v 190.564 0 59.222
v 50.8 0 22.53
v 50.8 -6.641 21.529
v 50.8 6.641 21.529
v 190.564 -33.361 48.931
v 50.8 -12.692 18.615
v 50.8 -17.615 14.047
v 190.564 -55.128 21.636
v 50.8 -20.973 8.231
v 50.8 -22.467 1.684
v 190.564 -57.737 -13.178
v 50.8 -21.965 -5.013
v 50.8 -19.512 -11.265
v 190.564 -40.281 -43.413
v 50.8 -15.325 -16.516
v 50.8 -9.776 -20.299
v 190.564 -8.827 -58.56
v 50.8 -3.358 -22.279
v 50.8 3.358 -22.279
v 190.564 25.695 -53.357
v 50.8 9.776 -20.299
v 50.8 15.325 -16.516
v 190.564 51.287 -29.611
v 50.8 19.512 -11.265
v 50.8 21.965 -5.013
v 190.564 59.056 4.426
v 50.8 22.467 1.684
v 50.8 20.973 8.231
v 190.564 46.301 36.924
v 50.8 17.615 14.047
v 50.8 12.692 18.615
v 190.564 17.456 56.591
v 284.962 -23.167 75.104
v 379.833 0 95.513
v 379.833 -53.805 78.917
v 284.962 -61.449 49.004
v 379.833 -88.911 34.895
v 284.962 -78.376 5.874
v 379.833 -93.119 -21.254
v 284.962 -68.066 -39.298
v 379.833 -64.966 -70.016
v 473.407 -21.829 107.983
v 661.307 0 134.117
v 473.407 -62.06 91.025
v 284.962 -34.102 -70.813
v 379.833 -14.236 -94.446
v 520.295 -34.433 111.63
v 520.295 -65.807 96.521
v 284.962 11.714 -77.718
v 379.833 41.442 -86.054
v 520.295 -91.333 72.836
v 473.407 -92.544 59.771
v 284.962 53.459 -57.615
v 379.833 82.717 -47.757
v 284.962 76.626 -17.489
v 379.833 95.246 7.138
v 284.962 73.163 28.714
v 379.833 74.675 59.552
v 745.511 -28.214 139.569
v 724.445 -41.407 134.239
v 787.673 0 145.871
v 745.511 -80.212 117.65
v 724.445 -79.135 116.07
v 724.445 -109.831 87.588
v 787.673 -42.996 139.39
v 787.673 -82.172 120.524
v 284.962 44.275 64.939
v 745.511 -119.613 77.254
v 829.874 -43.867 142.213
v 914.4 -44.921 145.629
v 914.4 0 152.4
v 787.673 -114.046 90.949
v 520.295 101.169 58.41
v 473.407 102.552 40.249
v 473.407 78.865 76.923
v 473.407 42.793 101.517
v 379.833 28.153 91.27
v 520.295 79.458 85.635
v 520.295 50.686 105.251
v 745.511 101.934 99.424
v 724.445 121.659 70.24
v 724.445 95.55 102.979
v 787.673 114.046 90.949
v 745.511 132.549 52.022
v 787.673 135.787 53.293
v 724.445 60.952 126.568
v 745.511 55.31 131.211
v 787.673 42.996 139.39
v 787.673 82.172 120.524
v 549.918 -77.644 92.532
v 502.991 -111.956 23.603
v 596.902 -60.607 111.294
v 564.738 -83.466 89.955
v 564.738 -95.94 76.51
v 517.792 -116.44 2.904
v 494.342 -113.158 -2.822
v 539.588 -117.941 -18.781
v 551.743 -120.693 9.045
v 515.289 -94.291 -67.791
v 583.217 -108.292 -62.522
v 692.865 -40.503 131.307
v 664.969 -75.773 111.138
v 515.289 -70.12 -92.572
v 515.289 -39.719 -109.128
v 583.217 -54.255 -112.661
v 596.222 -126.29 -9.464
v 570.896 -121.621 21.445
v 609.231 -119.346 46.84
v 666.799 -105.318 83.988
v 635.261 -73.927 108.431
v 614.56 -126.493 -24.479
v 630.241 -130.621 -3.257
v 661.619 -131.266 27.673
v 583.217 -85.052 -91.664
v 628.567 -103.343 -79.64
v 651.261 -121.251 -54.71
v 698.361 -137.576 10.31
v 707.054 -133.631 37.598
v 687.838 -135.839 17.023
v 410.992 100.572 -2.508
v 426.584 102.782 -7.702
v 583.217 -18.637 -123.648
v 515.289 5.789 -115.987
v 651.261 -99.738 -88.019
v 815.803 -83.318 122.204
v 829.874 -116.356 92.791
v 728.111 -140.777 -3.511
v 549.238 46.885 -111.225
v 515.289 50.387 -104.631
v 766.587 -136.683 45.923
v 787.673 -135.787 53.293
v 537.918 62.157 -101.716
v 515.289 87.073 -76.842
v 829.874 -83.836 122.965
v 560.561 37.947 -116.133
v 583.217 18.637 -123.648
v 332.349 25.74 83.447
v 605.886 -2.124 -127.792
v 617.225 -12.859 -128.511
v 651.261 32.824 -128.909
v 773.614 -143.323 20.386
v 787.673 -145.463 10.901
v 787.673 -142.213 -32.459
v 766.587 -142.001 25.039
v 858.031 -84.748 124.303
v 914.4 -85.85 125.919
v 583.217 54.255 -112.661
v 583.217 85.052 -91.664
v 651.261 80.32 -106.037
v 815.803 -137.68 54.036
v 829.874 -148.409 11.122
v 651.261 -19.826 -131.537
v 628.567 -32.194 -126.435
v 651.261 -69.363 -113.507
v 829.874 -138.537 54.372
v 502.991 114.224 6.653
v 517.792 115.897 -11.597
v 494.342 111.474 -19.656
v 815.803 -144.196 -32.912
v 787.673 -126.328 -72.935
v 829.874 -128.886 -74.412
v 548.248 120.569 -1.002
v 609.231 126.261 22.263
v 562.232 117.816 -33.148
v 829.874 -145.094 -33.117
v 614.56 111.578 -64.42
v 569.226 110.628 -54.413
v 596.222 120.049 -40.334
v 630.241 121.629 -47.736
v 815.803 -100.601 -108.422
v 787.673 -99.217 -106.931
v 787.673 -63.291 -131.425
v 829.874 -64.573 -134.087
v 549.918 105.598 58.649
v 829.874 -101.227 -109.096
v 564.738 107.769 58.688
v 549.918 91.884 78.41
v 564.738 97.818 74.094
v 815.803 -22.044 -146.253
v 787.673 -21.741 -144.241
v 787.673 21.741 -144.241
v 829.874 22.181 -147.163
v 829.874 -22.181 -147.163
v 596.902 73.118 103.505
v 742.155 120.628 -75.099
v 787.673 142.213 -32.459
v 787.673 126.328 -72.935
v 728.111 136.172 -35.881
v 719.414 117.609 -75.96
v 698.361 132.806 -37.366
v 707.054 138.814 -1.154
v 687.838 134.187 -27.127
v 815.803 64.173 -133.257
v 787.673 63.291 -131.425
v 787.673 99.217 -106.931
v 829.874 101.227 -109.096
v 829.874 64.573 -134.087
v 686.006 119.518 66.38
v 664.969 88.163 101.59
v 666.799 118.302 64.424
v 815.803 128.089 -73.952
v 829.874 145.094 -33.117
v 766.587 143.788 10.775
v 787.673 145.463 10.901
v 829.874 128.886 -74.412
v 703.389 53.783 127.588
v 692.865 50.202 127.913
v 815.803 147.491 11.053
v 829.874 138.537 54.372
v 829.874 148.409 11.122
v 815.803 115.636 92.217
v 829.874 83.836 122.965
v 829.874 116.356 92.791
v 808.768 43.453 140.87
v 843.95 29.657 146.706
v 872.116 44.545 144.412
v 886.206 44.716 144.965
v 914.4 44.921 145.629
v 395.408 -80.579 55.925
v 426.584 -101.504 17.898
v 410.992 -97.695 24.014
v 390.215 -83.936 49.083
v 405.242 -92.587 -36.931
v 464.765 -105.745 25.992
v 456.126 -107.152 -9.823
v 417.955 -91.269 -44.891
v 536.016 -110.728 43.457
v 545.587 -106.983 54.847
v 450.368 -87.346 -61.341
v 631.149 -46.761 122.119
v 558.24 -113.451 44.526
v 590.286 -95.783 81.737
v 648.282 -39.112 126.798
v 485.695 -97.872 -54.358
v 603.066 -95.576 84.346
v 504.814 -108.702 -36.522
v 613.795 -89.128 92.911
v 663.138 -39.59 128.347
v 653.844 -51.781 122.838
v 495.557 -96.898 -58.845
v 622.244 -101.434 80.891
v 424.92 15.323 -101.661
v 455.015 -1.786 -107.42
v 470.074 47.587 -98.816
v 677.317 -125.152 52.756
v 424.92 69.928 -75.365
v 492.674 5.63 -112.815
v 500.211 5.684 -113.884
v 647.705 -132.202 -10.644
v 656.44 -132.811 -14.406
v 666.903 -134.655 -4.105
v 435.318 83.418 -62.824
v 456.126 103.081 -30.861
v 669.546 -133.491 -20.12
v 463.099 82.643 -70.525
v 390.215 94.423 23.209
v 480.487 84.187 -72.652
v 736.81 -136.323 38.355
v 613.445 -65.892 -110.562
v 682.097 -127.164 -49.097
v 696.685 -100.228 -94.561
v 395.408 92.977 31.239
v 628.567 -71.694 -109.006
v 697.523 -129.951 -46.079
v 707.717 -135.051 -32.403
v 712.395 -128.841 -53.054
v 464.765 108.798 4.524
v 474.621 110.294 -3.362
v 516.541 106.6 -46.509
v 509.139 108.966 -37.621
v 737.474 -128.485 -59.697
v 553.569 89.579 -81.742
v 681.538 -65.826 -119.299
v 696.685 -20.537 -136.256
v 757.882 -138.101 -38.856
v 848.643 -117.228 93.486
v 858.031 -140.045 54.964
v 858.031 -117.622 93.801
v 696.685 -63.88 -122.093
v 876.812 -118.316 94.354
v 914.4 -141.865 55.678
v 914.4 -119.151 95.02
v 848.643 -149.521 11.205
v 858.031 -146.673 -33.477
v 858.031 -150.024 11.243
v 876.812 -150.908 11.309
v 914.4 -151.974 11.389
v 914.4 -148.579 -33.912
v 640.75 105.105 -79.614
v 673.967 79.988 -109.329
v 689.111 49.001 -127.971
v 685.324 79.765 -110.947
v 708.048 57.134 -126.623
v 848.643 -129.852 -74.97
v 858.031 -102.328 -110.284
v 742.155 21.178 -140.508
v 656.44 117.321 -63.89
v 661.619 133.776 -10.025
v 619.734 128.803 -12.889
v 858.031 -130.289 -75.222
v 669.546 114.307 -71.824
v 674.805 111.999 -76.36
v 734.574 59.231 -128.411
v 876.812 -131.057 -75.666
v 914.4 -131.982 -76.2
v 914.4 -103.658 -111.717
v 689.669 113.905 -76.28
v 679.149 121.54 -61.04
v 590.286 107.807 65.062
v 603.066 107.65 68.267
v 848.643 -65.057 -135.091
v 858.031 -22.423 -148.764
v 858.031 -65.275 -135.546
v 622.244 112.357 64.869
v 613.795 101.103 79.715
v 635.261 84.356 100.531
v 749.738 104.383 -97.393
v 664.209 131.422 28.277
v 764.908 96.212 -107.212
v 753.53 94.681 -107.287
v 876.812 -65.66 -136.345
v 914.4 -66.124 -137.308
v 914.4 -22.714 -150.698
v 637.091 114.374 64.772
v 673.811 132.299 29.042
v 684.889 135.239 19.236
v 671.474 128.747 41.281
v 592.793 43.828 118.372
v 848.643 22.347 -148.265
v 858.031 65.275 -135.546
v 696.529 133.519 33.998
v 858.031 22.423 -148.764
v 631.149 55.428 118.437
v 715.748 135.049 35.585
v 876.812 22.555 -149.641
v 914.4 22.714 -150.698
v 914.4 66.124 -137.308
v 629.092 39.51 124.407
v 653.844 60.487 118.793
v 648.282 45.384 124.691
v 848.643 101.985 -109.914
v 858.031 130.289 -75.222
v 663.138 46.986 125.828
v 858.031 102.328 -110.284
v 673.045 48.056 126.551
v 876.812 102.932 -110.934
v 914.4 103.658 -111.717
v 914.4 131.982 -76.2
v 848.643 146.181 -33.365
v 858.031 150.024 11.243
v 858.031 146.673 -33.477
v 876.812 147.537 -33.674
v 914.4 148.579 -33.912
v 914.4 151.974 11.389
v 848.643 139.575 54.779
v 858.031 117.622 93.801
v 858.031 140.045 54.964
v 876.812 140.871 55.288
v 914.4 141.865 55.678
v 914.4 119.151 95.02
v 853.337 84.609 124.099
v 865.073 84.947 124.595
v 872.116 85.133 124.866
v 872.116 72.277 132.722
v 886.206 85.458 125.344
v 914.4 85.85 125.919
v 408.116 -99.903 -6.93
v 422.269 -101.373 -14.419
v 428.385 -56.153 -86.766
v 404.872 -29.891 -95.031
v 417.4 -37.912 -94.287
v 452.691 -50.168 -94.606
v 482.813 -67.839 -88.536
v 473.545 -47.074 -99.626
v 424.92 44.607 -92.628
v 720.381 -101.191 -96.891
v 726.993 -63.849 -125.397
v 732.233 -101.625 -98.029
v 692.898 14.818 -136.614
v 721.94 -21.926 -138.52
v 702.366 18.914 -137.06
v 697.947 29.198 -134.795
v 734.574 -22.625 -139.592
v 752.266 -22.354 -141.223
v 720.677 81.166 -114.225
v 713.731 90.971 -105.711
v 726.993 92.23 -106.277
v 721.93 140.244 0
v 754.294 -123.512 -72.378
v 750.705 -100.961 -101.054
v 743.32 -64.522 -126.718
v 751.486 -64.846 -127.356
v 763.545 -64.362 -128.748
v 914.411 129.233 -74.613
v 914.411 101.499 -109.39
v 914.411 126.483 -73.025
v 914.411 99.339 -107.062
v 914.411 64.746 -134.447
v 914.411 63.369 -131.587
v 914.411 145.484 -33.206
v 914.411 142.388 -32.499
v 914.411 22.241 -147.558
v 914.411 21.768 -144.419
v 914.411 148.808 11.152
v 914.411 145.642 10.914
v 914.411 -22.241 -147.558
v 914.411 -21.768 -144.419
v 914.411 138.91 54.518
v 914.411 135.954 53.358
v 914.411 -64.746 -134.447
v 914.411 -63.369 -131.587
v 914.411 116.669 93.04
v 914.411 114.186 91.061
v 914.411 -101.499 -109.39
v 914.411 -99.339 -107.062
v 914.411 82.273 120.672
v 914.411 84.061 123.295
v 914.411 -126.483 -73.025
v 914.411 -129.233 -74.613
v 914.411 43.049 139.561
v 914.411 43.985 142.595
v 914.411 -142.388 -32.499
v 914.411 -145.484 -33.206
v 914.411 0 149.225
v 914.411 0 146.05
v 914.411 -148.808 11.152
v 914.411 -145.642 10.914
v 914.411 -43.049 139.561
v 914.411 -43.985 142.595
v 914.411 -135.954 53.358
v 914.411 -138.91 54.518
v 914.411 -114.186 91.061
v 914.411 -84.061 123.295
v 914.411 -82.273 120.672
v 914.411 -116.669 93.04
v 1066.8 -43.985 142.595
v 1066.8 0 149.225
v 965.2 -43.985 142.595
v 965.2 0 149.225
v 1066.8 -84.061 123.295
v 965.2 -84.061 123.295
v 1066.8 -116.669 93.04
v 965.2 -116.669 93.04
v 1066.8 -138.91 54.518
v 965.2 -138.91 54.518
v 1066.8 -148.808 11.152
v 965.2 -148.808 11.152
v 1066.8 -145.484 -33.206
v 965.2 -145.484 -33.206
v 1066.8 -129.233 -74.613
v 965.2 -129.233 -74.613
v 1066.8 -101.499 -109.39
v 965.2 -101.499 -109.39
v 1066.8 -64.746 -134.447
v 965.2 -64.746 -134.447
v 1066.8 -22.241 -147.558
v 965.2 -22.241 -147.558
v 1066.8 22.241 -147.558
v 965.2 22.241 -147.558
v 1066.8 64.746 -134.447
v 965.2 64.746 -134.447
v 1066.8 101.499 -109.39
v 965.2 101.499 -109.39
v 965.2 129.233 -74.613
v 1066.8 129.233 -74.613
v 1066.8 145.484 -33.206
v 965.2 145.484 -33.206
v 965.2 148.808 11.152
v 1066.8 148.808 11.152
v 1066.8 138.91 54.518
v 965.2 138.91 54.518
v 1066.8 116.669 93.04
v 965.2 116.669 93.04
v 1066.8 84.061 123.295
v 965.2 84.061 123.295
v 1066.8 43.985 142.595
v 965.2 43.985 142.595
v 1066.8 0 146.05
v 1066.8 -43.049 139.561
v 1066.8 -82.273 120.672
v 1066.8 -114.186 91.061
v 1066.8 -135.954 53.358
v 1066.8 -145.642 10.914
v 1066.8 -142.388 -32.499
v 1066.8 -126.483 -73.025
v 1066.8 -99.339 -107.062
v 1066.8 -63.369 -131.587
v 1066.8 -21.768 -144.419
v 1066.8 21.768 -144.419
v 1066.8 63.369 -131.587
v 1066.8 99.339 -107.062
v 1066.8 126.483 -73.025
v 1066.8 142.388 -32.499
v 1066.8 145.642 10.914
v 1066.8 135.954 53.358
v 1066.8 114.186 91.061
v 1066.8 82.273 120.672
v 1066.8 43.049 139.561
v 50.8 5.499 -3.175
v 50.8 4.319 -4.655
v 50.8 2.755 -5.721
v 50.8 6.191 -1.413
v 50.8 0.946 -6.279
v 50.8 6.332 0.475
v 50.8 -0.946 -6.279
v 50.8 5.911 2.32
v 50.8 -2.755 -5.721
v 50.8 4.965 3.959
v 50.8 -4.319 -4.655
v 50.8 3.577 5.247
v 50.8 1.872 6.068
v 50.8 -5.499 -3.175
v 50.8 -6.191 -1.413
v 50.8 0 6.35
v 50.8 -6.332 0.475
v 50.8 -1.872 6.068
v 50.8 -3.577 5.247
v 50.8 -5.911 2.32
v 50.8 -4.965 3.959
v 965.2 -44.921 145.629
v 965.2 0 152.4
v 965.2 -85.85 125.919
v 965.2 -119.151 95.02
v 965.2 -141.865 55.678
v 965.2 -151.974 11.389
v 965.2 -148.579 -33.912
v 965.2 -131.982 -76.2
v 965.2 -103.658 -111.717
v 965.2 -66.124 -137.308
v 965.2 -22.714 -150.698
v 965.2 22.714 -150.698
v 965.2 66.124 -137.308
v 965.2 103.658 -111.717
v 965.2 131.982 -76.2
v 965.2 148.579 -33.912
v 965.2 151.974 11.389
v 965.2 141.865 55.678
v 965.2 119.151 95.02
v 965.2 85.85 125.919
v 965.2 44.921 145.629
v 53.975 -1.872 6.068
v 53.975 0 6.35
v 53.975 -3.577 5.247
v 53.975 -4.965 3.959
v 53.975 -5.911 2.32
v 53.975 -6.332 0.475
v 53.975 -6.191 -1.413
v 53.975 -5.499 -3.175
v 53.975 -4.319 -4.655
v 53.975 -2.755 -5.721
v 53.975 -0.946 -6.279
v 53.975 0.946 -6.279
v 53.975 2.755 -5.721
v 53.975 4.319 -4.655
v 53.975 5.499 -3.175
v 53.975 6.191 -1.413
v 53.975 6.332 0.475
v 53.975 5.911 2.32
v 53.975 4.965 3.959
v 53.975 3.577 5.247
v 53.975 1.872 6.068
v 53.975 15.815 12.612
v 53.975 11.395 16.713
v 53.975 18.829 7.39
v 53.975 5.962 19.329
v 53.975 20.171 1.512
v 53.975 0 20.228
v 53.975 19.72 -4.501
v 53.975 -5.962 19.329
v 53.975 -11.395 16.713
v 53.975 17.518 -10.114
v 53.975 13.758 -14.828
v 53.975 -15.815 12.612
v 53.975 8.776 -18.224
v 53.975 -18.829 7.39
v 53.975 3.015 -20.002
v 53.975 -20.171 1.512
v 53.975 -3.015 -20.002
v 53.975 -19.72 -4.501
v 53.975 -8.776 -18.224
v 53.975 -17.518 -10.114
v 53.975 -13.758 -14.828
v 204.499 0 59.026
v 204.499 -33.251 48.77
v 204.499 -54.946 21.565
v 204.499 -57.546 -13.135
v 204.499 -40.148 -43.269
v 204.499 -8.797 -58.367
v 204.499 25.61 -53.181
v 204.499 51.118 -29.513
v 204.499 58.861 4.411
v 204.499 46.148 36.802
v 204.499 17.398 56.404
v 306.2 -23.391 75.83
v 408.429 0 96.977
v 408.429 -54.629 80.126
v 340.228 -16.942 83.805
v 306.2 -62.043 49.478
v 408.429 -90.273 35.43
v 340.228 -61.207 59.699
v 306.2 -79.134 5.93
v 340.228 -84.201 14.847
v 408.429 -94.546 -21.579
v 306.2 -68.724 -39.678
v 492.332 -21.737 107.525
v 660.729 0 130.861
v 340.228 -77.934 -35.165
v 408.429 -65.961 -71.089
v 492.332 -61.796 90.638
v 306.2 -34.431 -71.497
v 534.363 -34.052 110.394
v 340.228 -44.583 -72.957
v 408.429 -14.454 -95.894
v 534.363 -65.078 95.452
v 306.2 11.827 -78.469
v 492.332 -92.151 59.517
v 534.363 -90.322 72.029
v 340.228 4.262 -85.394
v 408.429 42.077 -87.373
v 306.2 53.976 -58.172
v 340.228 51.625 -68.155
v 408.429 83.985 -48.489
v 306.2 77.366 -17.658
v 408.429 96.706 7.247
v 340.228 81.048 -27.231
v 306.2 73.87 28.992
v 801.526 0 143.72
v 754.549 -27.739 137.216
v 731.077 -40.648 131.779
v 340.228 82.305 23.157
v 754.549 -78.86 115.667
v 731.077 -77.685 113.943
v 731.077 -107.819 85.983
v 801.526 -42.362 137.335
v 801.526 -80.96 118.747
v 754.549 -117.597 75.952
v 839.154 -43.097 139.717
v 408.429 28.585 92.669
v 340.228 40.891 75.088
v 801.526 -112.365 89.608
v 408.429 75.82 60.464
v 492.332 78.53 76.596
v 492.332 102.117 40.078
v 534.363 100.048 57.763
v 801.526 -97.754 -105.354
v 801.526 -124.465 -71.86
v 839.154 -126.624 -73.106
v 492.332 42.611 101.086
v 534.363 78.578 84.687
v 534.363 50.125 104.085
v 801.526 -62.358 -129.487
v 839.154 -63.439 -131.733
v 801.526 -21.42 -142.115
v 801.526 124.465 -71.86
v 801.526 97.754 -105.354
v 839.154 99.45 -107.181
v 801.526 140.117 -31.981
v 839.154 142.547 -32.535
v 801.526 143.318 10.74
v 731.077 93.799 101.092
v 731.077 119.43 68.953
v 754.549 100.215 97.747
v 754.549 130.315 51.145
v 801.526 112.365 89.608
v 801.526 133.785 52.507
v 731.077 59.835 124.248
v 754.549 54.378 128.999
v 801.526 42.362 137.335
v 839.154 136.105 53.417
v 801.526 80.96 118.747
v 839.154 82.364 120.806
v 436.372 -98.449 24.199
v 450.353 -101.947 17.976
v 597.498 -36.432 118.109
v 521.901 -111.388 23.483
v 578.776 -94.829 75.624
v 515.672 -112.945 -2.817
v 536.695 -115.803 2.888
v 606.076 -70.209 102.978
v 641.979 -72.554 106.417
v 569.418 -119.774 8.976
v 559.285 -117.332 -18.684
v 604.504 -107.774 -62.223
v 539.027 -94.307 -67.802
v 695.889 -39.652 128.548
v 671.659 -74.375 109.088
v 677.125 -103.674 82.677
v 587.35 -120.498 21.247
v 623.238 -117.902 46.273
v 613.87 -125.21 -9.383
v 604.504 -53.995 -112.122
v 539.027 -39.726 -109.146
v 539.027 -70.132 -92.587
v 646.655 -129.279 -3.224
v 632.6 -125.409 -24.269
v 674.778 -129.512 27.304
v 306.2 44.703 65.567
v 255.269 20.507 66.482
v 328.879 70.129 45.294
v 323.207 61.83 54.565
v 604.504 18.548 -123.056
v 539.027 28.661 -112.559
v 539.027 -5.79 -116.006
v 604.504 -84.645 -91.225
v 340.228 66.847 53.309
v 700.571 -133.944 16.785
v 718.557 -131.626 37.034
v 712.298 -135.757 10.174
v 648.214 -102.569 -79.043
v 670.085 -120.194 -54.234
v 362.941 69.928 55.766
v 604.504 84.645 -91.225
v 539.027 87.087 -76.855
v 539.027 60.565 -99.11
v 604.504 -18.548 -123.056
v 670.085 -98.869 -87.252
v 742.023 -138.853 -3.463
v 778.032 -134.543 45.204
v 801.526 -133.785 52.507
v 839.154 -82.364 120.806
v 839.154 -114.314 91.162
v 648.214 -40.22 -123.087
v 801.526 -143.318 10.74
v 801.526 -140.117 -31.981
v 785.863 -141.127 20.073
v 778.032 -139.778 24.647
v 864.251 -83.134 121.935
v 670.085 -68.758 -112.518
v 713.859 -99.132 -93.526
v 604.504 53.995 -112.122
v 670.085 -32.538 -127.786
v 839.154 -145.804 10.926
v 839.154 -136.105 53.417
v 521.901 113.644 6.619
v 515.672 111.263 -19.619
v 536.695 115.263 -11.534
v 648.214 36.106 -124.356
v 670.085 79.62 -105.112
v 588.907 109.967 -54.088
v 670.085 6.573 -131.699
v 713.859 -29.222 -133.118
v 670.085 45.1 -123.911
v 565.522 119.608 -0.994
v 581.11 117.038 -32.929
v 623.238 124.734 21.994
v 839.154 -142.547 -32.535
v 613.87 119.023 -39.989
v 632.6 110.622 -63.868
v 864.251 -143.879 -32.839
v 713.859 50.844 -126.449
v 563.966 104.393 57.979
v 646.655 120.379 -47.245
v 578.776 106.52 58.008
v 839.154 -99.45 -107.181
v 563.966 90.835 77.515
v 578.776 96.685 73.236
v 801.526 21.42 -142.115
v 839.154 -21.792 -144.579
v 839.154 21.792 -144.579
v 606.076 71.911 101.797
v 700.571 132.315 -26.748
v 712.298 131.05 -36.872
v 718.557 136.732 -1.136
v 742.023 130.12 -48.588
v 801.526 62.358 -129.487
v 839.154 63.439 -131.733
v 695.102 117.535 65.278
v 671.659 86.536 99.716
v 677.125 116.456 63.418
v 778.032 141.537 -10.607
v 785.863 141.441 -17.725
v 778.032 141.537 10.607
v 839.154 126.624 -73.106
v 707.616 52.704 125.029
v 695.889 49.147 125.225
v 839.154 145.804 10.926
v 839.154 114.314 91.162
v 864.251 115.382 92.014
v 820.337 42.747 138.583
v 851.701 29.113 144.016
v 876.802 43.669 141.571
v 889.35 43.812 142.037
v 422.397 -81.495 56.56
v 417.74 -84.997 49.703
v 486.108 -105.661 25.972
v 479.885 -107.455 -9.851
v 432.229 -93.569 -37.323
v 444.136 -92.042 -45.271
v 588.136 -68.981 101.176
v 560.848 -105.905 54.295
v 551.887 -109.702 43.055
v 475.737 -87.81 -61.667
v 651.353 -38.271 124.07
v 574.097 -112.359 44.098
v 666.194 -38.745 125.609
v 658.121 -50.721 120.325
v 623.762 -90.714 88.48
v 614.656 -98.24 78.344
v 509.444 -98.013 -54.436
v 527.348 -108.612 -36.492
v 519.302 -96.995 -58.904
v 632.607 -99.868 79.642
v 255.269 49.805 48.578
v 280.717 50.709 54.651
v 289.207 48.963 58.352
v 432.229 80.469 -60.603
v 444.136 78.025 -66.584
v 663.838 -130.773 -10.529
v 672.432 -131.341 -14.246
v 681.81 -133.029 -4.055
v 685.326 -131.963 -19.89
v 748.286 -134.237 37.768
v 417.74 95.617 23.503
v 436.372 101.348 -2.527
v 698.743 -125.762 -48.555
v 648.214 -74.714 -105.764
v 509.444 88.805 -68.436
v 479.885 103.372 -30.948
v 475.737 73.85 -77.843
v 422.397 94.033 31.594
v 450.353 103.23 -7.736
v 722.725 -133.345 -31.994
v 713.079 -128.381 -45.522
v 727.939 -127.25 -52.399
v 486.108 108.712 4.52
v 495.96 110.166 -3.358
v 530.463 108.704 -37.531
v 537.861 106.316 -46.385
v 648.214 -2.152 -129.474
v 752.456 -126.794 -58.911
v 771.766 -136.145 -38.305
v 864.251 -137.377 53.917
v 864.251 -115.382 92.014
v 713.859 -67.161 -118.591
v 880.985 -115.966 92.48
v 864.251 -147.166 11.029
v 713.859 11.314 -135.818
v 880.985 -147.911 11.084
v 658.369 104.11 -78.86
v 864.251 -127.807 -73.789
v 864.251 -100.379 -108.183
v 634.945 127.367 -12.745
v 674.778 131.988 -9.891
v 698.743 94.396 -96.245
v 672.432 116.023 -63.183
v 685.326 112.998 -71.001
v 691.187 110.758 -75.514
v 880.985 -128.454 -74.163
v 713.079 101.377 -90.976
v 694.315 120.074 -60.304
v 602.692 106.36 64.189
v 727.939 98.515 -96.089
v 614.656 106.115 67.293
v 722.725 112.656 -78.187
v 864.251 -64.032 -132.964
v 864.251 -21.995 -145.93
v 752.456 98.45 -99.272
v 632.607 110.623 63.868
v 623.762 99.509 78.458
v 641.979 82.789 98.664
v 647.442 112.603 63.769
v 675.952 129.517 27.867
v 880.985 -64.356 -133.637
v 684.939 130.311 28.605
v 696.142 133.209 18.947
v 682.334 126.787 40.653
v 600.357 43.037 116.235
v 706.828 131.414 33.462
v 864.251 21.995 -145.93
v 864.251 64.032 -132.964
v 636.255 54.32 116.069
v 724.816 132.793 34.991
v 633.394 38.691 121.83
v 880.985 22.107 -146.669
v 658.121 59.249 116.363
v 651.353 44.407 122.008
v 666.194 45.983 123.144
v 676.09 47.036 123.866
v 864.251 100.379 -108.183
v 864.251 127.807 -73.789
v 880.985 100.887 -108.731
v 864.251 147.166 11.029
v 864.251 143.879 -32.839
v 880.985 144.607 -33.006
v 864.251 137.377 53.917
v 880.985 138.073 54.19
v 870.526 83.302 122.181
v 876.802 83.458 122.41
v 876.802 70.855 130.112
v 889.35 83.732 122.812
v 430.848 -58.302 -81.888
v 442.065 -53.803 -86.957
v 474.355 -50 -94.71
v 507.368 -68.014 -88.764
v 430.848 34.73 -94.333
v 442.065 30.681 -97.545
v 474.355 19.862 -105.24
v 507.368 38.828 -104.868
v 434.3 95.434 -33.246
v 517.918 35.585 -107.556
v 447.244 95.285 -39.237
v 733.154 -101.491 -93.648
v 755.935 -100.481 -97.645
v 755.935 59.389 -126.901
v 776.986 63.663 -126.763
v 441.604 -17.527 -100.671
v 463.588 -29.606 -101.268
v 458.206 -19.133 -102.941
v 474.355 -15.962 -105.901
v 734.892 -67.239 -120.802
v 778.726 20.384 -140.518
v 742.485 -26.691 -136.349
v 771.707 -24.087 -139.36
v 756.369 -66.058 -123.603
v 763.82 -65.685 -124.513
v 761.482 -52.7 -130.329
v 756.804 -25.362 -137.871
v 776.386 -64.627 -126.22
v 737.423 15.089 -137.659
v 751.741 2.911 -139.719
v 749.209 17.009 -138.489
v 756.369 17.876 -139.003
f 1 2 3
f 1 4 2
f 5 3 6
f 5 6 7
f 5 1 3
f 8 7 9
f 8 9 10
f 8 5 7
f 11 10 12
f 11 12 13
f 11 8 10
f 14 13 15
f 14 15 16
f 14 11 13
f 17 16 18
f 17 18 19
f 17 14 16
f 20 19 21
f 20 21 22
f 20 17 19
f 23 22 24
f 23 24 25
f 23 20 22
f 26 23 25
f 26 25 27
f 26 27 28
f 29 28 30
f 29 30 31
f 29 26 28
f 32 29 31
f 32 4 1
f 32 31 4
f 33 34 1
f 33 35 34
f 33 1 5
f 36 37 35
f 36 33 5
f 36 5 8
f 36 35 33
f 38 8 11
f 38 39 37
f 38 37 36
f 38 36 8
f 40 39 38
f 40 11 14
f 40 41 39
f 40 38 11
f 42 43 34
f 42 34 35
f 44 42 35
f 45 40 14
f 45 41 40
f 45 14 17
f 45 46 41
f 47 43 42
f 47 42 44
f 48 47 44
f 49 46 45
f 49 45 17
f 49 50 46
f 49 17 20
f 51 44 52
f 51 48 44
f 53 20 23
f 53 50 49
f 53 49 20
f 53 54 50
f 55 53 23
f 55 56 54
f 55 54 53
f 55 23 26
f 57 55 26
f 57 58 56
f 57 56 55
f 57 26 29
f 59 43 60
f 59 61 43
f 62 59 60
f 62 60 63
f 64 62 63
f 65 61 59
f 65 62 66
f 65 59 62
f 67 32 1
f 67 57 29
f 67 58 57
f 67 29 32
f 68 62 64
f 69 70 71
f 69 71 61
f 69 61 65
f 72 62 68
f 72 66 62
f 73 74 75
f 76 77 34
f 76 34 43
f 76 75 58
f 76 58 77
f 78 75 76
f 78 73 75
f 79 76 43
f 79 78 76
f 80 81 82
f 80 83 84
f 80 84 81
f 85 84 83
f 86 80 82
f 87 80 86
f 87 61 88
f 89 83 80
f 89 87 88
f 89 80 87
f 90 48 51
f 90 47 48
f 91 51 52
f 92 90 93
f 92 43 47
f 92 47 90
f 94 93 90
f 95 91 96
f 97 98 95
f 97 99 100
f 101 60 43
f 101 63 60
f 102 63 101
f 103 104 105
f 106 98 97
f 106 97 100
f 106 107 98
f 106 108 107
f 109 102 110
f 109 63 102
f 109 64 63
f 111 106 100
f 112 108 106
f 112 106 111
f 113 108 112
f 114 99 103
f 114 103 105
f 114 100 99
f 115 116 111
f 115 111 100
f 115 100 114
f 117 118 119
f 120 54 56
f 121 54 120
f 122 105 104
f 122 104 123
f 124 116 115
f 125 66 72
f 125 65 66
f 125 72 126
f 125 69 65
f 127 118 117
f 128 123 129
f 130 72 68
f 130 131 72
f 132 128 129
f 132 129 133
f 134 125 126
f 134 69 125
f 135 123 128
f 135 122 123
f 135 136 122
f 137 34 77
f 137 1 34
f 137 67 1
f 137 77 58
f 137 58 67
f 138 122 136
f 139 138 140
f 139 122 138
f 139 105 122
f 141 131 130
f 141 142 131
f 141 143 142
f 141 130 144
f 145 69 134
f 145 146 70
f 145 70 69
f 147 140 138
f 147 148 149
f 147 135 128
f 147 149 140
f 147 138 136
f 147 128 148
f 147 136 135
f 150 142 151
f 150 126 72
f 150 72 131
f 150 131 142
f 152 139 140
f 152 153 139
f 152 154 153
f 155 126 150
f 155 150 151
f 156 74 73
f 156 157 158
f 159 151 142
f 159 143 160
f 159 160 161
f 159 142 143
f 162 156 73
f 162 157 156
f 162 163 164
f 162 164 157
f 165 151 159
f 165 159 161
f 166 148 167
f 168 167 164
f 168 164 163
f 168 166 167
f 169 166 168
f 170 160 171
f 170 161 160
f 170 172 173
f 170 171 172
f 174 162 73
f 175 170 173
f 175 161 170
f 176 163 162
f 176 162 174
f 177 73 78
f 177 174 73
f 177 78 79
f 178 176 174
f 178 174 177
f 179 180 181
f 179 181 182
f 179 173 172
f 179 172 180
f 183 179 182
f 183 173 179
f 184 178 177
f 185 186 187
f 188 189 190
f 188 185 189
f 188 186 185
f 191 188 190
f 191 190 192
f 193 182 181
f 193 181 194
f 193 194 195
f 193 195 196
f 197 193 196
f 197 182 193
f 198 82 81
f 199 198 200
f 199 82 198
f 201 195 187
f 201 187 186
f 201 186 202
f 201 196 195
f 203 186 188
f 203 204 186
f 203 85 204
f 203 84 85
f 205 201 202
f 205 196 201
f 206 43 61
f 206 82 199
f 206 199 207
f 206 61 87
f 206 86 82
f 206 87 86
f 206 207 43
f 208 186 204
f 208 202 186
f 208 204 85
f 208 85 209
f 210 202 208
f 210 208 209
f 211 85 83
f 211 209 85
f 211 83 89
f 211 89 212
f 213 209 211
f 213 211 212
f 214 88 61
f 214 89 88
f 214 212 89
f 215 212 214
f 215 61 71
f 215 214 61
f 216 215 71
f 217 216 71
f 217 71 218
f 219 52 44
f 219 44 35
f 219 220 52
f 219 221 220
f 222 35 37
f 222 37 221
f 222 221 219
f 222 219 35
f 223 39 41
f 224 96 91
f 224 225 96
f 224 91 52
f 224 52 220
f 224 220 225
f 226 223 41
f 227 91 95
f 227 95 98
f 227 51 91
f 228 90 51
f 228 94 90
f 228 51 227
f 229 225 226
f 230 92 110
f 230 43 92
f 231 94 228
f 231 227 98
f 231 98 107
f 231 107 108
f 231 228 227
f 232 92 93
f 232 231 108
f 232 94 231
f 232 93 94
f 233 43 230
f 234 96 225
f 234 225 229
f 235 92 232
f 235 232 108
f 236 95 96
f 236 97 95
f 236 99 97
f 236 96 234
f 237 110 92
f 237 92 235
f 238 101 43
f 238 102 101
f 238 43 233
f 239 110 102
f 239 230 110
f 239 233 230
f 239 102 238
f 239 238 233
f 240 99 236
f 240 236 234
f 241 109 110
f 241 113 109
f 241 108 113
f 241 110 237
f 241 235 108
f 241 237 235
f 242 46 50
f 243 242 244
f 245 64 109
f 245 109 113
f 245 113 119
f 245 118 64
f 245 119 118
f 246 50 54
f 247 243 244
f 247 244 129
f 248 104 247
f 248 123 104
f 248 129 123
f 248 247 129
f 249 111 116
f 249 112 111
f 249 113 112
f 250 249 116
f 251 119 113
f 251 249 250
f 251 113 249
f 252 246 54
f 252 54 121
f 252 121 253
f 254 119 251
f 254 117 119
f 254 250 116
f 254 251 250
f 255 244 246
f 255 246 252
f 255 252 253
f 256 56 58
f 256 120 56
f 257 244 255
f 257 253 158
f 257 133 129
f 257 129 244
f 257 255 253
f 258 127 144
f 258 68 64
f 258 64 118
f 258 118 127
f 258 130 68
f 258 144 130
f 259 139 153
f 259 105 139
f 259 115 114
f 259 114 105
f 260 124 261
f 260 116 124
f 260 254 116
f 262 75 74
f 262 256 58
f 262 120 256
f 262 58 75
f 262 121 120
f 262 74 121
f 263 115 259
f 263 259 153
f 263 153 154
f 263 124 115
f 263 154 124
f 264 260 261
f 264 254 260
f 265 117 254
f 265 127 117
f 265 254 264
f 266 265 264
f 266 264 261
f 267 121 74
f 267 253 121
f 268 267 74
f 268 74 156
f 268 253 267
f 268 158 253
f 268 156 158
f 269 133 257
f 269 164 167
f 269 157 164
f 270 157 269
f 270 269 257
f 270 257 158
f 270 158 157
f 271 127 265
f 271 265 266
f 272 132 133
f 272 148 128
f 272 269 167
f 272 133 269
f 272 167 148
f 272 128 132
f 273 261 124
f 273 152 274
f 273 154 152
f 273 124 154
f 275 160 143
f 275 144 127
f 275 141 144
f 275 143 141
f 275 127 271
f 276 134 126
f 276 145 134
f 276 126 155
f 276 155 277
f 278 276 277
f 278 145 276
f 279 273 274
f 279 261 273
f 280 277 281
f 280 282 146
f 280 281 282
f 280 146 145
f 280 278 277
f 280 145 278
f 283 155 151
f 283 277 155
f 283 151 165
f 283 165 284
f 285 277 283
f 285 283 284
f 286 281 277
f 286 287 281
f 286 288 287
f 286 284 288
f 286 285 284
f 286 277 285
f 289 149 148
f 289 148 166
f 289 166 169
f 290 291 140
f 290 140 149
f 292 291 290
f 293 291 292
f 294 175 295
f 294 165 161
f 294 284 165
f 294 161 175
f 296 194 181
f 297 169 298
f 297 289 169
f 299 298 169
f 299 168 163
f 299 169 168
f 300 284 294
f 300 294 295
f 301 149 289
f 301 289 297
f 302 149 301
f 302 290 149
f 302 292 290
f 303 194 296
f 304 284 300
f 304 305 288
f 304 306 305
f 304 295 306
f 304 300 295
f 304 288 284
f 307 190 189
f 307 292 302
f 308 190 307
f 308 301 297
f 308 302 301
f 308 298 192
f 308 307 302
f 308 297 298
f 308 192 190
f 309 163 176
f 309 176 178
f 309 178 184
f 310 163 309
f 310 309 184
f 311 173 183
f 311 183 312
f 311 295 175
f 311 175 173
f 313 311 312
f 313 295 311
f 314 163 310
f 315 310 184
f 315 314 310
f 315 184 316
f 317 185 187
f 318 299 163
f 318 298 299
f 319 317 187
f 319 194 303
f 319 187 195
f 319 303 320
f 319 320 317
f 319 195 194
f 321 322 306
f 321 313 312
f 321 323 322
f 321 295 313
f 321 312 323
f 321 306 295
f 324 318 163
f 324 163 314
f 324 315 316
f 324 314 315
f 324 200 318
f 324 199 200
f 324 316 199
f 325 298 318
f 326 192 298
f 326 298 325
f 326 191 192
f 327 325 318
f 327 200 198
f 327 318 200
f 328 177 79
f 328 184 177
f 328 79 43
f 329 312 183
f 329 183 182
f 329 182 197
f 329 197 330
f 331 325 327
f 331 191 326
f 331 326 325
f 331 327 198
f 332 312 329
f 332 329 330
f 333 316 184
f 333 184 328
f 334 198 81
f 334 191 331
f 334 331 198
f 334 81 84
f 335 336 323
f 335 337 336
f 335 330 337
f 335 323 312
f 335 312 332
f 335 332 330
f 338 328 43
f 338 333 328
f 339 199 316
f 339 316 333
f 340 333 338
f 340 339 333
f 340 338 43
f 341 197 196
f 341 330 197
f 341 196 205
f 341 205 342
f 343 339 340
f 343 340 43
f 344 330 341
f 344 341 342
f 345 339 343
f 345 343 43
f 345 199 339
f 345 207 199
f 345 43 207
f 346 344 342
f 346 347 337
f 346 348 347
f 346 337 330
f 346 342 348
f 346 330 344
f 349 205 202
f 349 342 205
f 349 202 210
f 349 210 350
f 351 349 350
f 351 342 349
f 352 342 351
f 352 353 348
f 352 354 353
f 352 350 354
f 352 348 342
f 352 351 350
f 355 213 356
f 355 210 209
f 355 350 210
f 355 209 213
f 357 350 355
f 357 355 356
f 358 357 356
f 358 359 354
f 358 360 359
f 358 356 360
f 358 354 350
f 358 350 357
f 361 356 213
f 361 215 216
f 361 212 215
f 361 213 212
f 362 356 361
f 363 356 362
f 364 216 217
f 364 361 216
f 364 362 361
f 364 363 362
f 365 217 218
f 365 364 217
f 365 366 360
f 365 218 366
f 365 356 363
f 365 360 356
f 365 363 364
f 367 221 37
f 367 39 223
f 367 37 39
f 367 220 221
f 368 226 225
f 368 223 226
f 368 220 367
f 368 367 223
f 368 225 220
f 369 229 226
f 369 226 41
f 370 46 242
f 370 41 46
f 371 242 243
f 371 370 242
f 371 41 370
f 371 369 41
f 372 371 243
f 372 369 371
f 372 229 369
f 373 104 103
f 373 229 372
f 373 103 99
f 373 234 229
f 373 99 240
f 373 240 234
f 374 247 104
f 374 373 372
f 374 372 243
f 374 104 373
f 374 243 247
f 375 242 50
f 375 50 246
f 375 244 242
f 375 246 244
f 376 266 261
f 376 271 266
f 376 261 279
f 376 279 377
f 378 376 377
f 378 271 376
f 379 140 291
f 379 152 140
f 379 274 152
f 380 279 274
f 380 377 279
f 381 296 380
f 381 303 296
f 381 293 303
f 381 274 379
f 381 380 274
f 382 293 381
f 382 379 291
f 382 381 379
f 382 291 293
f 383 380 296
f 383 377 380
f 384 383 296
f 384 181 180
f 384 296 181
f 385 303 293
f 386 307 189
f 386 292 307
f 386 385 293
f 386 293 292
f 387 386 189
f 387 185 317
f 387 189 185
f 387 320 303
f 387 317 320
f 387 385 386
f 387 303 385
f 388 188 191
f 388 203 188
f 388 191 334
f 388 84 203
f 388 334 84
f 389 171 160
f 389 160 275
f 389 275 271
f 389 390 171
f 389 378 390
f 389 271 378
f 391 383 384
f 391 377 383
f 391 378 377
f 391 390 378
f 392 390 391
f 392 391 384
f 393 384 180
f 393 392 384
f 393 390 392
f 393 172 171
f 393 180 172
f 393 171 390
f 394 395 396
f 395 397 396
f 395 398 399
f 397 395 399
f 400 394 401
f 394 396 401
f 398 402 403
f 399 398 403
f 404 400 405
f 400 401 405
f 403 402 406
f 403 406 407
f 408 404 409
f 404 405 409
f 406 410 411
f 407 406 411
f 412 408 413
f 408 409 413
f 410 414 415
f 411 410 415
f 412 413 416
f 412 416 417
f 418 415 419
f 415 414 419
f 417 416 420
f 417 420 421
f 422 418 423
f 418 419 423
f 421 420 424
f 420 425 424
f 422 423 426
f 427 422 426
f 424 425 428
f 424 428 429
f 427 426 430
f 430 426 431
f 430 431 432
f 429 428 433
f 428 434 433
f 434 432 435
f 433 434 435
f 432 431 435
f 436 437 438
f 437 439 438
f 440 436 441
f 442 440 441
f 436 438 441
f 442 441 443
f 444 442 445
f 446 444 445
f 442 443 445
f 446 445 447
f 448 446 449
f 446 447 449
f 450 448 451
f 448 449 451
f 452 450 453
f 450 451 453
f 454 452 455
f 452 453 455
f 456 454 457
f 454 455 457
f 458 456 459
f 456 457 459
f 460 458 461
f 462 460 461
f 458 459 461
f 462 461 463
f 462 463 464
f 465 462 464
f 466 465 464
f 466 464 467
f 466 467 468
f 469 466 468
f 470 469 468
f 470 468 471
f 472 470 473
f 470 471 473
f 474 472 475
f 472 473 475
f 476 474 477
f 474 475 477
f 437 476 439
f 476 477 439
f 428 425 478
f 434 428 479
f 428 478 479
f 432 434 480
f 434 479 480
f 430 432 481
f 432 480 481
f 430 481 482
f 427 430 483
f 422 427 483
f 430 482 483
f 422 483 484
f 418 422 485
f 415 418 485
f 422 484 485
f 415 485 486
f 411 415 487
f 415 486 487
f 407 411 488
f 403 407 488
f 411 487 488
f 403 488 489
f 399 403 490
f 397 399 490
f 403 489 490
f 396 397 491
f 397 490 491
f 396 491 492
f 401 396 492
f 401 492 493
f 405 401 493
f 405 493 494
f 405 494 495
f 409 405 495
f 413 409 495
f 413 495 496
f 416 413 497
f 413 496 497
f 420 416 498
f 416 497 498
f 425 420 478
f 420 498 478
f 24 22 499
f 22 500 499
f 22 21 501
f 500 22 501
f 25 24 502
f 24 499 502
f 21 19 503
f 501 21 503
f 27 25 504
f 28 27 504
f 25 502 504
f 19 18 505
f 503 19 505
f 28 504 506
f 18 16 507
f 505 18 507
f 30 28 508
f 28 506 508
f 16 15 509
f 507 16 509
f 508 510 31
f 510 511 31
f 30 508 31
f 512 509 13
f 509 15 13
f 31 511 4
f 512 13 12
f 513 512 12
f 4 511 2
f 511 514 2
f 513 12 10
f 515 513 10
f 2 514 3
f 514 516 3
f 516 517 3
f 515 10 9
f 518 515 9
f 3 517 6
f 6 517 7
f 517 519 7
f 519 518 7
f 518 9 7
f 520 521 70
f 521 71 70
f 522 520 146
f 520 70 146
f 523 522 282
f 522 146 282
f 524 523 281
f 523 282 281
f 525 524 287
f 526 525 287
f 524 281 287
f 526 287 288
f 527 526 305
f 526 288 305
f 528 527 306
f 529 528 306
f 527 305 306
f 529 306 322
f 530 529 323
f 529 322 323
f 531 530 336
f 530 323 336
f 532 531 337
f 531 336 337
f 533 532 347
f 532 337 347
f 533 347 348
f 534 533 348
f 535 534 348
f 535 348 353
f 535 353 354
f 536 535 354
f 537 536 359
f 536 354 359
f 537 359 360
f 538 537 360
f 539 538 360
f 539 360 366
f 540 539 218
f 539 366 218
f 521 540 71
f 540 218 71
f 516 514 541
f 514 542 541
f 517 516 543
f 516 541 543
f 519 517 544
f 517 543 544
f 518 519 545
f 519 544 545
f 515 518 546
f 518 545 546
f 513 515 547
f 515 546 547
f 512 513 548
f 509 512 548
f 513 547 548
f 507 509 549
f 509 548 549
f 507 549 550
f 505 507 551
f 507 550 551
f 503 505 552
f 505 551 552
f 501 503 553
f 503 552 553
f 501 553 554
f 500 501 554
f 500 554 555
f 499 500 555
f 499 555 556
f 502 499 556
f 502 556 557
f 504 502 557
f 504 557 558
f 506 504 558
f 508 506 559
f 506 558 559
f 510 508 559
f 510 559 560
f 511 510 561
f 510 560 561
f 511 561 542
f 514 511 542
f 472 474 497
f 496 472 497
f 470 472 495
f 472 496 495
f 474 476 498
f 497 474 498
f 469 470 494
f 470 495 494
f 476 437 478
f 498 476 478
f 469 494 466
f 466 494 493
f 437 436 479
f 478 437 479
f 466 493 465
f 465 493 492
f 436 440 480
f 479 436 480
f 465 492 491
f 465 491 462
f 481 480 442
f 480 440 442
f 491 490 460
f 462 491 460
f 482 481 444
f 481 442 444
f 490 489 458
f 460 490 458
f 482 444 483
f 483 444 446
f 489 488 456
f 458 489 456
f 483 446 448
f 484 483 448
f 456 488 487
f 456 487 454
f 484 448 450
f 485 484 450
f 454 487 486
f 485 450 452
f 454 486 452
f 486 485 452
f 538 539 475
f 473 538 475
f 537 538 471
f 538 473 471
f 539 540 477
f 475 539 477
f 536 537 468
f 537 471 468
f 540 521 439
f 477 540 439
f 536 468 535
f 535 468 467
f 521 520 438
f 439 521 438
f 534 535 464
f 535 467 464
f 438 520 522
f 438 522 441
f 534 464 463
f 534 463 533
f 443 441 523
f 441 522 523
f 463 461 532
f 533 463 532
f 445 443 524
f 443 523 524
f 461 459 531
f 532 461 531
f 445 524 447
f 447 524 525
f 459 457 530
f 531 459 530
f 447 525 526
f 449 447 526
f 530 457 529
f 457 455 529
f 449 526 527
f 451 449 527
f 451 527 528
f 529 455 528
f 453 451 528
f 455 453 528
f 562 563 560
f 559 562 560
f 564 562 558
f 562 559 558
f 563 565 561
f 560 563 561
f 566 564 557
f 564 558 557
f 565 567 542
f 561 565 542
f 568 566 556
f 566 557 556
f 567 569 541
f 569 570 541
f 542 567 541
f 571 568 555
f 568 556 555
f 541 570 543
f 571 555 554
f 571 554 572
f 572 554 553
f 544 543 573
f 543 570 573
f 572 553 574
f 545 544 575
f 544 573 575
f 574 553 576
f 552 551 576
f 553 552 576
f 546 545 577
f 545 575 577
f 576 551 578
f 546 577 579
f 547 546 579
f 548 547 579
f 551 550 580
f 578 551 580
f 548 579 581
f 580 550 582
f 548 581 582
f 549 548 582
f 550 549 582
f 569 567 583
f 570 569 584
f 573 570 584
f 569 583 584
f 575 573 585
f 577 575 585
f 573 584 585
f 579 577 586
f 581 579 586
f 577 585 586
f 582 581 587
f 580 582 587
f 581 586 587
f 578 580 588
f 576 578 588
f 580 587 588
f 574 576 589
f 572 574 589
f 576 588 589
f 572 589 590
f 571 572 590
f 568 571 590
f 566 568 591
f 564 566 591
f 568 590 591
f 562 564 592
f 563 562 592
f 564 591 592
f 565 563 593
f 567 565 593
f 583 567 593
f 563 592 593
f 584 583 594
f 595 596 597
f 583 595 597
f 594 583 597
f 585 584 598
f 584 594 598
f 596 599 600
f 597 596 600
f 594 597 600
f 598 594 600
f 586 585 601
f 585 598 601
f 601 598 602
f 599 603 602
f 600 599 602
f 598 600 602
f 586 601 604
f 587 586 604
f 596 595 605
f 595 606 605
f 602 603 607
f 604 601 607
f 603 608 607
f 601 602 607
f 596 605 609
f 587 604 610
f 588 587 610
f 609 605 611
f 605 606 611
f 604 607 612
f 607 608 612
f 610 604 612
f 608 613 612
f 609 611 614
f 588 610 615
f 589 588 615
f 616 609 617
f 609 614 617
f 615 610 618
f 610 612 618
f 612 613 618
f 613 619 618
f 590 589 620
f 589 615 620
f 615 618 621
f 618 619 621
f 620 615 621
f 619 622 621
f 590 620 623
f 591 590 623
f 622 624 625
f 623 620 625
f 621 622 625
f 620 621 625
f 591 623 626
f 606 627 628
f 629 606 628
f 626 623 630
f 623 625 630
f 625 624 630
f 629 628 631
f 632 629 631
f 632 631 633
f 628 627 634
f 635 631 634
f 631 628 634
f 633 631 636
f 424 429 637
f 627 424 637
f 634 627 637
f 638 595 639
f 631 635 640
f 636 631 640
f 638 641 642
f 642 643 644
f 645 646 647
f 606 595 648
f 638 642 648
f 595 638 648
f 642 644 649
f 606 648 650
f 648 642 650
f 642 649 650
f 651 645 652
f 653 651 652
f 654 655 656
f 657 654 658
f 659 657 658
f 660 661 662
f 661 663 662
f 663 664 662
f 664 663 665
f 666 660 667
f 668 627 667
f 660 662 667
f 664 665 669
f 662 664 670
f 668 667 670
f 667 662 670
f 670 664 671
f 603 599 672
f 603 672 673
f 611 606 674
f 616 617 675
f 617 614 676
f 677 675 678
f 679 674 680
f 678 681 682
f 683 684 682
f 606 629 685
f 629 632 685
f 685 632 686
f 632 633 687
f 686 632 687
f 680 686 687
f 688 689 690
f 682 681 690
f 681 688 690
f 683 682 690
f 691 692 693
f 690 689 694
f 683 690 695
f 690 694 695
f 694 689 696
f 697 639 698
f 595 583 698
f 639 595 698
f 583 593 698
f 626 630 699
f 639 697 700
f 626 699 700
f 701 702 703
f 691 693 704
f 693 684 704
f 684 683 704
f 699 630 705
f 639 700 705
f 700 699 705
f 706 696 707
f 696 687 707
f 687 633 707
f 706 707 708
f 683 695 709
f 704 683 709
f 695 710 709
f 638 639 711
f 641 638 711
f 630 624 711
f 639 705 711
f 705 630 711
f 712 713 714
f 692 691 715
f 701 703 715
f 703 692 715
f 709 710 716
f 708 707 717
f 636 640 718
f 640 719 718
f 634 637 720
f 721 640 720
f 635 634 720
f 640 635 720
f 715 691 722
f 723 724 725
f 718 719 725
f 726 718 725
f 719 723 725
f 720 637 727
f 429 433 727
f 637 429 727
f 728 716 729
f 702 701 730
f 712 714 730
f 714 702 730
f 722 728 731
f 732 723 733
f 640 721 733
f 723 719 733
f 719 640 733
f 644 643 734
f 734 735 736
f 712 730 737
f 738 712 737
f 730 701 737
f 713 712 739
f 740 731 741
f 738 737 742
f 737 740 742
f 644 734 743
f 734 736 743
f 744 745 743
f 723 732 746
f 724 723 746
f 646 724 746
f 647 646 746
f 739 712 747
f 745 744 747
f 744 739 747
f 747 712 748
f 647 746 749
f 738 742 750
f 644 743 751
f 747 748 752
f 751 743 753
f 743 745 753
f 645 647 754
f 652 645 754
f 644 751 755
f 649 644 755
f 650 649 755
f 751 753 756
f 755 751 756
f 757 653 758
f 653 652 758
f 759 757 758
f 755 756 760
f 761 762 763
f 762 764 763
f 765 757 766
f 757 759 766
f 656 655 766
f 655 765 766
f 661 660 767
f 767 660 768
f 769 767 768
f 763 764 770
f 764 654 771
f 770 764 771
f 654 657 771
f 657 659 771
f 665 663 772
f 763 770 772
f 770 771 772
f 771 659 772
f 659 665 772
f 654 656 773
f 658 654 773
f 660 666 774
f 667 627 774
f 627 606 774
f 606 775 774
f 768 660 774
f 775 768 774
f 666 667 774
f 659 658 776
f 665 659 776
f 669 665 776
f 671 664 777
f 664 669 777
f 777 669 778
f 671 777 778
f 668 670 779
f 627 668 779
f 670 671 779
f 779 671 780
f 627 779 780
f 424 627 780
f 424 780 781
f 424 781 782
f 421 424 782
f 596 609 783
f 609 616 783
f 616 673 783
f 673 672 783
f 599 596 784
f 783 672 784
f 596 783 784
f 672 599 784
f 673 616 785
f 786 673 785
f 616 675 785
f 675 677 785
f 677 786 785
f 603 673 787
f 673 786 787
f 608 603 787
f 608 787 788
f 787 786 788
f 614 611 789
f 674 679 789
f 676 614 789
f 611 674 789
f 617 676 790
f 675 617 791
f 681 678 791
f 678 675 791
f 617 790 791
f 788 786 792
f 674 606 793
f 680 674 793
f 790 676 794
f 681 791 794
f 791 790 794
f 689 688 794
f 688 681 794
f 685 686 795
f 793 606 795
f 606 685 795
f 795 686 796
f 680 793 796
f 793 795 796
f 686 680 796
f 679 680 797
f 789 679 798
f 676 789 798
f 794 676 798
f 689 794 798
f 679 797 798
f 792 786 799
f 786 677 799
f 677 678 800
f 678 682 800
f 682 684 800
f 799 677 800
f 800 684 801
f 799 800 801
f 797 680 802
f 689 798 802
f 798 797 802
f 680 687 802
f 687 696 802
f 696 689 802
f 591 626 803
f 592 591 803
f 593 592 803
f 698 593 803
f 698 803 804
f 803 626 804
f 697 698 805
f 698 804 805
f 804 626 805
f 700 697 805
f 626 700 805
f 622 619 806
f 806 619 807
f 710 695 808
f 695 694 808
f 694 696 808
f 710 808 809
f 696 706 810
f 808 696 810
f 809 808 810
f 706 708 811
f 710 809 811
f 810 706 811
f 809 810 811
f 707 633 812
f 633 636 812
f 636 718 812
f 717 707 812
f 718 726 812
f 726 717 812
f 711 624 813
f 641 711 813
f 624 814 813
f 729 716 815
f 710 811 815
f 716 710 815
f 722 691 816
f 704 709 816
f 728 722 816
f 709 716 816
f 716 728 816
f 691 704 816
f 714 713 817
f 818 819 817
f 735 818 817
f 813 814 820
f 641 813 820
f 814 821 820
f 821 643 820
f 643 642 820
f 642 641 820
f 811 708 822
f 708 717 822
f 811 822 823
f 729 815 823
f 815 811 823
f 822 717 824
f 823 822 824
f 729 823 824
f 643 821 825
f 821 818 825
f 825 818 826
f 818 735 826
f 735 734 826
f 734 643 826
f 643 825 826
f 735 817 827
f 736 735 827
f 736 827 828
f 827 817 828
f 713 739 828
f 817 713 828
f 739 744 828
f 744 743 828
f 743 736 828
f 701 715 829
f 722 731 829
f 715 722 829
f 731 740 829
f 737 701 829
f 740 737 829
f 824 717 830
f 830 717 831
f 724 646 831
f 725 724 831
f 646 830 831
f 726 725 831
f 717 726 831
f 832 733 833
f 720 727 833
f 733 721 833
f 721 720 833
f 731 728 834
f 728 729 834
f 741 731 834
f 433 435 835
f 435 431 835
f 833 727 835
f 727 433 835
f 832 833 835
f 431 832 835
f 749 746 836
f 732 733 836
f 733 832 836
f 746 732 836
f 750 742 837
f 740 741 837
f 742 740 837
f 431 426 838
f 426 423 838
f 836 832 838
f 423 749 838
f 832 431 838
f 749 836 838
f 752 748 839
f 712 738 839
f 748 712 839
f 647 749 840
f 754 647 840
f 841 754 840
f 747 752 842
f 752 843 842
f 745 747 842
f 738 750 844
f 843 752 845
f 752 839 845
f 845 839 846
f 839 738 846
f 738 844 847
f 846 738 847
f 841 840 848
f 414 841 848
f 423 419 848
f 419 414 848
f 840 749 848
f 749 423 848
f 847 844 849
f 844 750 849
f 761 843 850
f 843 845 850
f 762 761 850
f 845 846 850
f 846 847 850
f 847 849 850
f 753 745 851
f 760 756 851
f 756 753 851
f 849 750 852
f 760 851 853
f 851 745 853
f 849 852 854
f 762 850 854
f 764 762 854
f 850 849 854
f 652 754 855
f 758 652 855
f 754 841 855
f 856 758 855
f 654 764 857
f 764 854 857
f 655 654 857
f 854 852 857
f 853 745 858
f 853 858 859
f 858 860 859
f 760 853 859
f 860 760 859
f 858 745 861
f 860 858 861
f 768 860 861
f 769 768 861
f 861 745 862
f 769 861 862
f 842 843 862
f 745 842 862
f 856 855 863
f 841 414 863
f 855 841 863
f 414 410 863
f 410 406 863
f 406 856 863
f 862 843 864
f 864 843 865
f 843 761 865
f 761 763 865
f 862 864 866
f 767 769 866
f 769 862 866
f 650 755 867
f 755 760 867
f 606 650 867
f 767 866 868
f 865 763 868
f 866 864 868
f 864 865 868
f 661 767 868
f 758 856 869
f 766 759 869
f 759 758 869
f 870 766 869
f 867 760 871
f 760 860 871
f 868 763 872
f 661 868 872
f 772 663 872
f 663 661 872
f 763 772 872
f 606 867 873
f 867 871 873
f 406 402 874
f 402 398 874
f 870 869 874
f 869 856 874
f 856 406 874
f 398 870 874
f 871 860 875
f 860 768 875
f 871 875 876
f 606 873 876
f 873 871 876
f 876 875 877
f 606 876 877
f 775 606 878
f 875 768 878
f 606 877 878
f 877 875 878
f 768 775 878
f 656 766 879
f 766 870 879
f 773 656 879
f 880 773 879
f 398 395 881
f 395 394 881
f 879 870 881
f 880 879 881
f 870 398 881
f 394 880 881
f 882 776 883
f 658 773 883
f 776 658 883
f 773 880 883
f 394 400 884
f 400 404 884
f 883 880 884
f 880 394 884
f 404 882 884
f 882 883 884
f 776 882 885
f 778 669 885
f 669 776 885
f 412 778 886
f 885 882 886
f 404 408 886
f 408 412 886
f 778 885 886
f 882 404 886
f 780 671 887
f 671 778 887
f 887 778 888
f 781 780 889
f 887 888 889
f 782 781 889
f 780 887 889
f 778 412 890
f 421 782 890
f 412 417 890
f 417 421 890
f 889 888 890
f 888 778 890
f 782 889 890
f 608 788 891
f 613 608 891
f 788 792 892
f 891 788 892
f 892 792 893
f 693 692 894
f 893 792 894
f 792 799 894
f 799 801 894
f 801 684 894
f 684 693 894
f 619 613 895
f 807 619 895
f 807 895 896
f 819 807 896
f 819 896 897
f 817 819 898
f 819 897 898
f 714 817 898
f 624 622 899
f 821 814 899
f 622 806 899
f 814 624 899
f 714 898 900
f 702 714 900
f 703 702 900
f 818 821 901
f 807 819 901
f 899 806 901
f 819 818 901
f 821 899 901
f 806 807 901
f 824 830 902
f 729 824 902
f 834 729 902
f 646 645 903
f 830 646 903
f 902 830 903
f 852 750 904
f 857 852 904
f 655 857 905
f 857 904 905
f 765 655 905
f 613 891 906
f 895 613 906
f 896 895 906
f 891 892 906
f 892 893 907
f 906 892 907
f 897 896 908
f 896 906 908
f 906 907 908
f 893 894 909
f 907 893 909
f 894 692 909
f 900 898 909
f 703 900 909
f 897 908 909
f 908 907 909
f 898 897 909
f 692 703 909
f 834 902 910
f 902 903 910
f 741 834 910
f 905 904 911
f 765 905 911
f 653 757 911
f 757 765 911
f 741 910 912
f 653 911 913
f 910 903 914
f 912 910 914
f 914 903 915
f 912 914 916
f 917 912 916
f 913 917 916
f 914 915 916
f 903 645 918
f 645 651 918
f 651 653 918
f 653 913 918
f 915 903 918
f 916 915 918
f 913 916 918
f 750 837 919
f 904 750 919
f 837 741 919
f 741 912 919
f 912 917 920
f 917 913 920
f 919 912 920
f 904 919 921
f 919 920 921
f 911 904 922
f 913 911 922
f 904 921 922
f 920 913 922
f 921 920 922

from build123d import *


with BuildPart() as part:
    # Sketch6 → Revolve1 (revolve)
    with BuildSketch(Plane.XY, mode=Mode.PRIVATE) as revolve1_sk:
        with BuildLine():
            Line((50.8, 22.53035676), (50.8, 6.35))
            Line((50.8, 6.35), (53.975, 6.35))
            Line((53.975, 6.35), (53.975, 20.227565916))
            add(Edge.make_bspline(
                [(53.975, 20.227565916), (54.291634879, 20.330430839), (55.162475518, 20.612719168), (56.636149311, 21.087725347), (58.867170376, 21.80102074), (61.522421046, 22.638682883), (64.736507837, 23.637812157), (68.023541536, 24.646609183), (72.39438926, 25.969741612), (77.802325895, 27.573199633), (84.37229967, 29.477097548), (93.118193973, 31.954107645), (108.466778526, 36.165197289), (130.491628823, 41.875745108), (165.870302673, 50.489926314), (210.303076361, 60.449379541), (281.693068548, 75.067985253), (371.347473816, 91.310304544), (479.374979471, 108.229836311), (569.684892552, 120.376775068), (642.076792345, 128.912483065), (696.438363769, 134.692640498), (750.863527692, 139.800693107), (796.267539796, 143.42521879), (832.617797313, 145.860290015), (859.890749047, 147.416222506), (882.628689993, 148.436275801), (898.53412358, 148.946546098), (907.62769622, 149.150954449), (912.14731785, 149.217348506), (914.4107585, 149.225018228)],
                knots=[0.06148136, 0.06148136, 0.06148136, 0.06148136, 0.06256458, 0.064402689, 0.066240798, 0.069917015, 0.073593232, 0.07726945, 0.080945667, 0.088298102, 0.095650536, 0.103002971, 0.11770784, 0.147117579, 0.176527318, 0.235346795, 0.294166272, 0.411805227, 0.529444182, 0.647083136, 0.705902613, 0.764722091, 0.823541568, 0.882361045, 0.911770784, 0.941180523, 0.970590261, 0.985295131, 0.992647565, 1, 1, 1, 1], degree=3))
            Line((914.4107585, 149.225018228), (914.4107585, 146.05))
            Line((914.4107585, 146.05), (1066.8, 146.05))
            Line((1066.8, 146.05), (1066.8, 149.225))
            Line((1066.8, 149.225), (965.2, 149.225))
            Line((965.2, 149.225), (965.2, 152.4))
            Line((965.2, 152.4), (914.4, 152.4))
            add(Edge.make_bspline(
                [(50.8, 22.53035676), (51.62596102, 22.801930188), (53.247366667, 23.331443773), (57.113810342, 24.581671091), (62.137627853, 26.163245596), (68.472923462, 28.113411094), (76.389796689, 30.474842786), (85.386033894, 33.081102875), (95.241355255, 35.841520364), (106.104903016, 38.788706559), (117.812200959, 41.867831442), (130.423899043, 45.08497442), (143.907449646, 48.417167108), (158.285989872, 51.860839853), (172.682057827, 55.208017205), (187.101006341, 58.468808185), (201.536340401, 61.648015415), (215.98908439, 64.751824582), (234.073297096, 68.542392147), (255.802551989, 72.956576003), (281.189453131, 77.92470015), (306.614812158, 82.692611325), (328.432361696, 86.646151134), (350.268122203, 90.497714312), (372.121192631, 94.250003895), (397.640090518, 98.488121242), (426.834492226, 103.147632175), (456.056824987, 107.628600482), (485.305388678, 111.934967932), (514.578772116, 116.069226586), (543.875783343, 120.032588186), (573.19542697, 123.82488003), (602.536868801, 127.444739672), (631.89942018, 130.889153604), (661.282519219, 134.153873932), (698.036524214, 138.001817701), (742.180870702, 142.229994267), (786.373789985, 145.926990276), (830.615211008, 148.98950394), (864.145536025, 150.817451898), (884.93243709, 151.702539519), (900.347440379, 152.177178216), (908.376949057, 152.340862845), (912.39222778, 152.393196617), (914.4, 152.4)],
                knots=[0.058888363, 0.058888363, 0.058888363, 0.058888363, 0.058888363, 0.06286181, 0.066835256, 0.074782149, 0.082729042, 0.090675935, 0.102752696, 0.114829458, 0.126906219, 0.138982981, 0.154876753, 0.170770526, 0.186664299, 0.202558071, 0.218451844, 0.234345618, 0.250239391, 0.266133165, 0.297920711, 0.329708258, 0.361495805, 0.377389579, 0.393283353, 0.4250709, 0.456858447, 0.488645994, 0.52043354, 0.552221087, 0.584008633, 0.615796181, 0.647583729, 0.679371276, 0.711158823, 0.74294637, 0.774733917, 0.838309011, 0.901884107, 0.933671654, 0.965459201, 0.9827296, 0.9913648, 1, 1, 1, 1, 1], degree=4))
        make_face()
    revolve(revolve1_sk.sketch.rotate(Axis((-61.64472501, 0, 0), (1, 0, 0)), 90), axis=Axis((-61.64472501, 0, 0), (1, 0, 0)))


solid = part.part
